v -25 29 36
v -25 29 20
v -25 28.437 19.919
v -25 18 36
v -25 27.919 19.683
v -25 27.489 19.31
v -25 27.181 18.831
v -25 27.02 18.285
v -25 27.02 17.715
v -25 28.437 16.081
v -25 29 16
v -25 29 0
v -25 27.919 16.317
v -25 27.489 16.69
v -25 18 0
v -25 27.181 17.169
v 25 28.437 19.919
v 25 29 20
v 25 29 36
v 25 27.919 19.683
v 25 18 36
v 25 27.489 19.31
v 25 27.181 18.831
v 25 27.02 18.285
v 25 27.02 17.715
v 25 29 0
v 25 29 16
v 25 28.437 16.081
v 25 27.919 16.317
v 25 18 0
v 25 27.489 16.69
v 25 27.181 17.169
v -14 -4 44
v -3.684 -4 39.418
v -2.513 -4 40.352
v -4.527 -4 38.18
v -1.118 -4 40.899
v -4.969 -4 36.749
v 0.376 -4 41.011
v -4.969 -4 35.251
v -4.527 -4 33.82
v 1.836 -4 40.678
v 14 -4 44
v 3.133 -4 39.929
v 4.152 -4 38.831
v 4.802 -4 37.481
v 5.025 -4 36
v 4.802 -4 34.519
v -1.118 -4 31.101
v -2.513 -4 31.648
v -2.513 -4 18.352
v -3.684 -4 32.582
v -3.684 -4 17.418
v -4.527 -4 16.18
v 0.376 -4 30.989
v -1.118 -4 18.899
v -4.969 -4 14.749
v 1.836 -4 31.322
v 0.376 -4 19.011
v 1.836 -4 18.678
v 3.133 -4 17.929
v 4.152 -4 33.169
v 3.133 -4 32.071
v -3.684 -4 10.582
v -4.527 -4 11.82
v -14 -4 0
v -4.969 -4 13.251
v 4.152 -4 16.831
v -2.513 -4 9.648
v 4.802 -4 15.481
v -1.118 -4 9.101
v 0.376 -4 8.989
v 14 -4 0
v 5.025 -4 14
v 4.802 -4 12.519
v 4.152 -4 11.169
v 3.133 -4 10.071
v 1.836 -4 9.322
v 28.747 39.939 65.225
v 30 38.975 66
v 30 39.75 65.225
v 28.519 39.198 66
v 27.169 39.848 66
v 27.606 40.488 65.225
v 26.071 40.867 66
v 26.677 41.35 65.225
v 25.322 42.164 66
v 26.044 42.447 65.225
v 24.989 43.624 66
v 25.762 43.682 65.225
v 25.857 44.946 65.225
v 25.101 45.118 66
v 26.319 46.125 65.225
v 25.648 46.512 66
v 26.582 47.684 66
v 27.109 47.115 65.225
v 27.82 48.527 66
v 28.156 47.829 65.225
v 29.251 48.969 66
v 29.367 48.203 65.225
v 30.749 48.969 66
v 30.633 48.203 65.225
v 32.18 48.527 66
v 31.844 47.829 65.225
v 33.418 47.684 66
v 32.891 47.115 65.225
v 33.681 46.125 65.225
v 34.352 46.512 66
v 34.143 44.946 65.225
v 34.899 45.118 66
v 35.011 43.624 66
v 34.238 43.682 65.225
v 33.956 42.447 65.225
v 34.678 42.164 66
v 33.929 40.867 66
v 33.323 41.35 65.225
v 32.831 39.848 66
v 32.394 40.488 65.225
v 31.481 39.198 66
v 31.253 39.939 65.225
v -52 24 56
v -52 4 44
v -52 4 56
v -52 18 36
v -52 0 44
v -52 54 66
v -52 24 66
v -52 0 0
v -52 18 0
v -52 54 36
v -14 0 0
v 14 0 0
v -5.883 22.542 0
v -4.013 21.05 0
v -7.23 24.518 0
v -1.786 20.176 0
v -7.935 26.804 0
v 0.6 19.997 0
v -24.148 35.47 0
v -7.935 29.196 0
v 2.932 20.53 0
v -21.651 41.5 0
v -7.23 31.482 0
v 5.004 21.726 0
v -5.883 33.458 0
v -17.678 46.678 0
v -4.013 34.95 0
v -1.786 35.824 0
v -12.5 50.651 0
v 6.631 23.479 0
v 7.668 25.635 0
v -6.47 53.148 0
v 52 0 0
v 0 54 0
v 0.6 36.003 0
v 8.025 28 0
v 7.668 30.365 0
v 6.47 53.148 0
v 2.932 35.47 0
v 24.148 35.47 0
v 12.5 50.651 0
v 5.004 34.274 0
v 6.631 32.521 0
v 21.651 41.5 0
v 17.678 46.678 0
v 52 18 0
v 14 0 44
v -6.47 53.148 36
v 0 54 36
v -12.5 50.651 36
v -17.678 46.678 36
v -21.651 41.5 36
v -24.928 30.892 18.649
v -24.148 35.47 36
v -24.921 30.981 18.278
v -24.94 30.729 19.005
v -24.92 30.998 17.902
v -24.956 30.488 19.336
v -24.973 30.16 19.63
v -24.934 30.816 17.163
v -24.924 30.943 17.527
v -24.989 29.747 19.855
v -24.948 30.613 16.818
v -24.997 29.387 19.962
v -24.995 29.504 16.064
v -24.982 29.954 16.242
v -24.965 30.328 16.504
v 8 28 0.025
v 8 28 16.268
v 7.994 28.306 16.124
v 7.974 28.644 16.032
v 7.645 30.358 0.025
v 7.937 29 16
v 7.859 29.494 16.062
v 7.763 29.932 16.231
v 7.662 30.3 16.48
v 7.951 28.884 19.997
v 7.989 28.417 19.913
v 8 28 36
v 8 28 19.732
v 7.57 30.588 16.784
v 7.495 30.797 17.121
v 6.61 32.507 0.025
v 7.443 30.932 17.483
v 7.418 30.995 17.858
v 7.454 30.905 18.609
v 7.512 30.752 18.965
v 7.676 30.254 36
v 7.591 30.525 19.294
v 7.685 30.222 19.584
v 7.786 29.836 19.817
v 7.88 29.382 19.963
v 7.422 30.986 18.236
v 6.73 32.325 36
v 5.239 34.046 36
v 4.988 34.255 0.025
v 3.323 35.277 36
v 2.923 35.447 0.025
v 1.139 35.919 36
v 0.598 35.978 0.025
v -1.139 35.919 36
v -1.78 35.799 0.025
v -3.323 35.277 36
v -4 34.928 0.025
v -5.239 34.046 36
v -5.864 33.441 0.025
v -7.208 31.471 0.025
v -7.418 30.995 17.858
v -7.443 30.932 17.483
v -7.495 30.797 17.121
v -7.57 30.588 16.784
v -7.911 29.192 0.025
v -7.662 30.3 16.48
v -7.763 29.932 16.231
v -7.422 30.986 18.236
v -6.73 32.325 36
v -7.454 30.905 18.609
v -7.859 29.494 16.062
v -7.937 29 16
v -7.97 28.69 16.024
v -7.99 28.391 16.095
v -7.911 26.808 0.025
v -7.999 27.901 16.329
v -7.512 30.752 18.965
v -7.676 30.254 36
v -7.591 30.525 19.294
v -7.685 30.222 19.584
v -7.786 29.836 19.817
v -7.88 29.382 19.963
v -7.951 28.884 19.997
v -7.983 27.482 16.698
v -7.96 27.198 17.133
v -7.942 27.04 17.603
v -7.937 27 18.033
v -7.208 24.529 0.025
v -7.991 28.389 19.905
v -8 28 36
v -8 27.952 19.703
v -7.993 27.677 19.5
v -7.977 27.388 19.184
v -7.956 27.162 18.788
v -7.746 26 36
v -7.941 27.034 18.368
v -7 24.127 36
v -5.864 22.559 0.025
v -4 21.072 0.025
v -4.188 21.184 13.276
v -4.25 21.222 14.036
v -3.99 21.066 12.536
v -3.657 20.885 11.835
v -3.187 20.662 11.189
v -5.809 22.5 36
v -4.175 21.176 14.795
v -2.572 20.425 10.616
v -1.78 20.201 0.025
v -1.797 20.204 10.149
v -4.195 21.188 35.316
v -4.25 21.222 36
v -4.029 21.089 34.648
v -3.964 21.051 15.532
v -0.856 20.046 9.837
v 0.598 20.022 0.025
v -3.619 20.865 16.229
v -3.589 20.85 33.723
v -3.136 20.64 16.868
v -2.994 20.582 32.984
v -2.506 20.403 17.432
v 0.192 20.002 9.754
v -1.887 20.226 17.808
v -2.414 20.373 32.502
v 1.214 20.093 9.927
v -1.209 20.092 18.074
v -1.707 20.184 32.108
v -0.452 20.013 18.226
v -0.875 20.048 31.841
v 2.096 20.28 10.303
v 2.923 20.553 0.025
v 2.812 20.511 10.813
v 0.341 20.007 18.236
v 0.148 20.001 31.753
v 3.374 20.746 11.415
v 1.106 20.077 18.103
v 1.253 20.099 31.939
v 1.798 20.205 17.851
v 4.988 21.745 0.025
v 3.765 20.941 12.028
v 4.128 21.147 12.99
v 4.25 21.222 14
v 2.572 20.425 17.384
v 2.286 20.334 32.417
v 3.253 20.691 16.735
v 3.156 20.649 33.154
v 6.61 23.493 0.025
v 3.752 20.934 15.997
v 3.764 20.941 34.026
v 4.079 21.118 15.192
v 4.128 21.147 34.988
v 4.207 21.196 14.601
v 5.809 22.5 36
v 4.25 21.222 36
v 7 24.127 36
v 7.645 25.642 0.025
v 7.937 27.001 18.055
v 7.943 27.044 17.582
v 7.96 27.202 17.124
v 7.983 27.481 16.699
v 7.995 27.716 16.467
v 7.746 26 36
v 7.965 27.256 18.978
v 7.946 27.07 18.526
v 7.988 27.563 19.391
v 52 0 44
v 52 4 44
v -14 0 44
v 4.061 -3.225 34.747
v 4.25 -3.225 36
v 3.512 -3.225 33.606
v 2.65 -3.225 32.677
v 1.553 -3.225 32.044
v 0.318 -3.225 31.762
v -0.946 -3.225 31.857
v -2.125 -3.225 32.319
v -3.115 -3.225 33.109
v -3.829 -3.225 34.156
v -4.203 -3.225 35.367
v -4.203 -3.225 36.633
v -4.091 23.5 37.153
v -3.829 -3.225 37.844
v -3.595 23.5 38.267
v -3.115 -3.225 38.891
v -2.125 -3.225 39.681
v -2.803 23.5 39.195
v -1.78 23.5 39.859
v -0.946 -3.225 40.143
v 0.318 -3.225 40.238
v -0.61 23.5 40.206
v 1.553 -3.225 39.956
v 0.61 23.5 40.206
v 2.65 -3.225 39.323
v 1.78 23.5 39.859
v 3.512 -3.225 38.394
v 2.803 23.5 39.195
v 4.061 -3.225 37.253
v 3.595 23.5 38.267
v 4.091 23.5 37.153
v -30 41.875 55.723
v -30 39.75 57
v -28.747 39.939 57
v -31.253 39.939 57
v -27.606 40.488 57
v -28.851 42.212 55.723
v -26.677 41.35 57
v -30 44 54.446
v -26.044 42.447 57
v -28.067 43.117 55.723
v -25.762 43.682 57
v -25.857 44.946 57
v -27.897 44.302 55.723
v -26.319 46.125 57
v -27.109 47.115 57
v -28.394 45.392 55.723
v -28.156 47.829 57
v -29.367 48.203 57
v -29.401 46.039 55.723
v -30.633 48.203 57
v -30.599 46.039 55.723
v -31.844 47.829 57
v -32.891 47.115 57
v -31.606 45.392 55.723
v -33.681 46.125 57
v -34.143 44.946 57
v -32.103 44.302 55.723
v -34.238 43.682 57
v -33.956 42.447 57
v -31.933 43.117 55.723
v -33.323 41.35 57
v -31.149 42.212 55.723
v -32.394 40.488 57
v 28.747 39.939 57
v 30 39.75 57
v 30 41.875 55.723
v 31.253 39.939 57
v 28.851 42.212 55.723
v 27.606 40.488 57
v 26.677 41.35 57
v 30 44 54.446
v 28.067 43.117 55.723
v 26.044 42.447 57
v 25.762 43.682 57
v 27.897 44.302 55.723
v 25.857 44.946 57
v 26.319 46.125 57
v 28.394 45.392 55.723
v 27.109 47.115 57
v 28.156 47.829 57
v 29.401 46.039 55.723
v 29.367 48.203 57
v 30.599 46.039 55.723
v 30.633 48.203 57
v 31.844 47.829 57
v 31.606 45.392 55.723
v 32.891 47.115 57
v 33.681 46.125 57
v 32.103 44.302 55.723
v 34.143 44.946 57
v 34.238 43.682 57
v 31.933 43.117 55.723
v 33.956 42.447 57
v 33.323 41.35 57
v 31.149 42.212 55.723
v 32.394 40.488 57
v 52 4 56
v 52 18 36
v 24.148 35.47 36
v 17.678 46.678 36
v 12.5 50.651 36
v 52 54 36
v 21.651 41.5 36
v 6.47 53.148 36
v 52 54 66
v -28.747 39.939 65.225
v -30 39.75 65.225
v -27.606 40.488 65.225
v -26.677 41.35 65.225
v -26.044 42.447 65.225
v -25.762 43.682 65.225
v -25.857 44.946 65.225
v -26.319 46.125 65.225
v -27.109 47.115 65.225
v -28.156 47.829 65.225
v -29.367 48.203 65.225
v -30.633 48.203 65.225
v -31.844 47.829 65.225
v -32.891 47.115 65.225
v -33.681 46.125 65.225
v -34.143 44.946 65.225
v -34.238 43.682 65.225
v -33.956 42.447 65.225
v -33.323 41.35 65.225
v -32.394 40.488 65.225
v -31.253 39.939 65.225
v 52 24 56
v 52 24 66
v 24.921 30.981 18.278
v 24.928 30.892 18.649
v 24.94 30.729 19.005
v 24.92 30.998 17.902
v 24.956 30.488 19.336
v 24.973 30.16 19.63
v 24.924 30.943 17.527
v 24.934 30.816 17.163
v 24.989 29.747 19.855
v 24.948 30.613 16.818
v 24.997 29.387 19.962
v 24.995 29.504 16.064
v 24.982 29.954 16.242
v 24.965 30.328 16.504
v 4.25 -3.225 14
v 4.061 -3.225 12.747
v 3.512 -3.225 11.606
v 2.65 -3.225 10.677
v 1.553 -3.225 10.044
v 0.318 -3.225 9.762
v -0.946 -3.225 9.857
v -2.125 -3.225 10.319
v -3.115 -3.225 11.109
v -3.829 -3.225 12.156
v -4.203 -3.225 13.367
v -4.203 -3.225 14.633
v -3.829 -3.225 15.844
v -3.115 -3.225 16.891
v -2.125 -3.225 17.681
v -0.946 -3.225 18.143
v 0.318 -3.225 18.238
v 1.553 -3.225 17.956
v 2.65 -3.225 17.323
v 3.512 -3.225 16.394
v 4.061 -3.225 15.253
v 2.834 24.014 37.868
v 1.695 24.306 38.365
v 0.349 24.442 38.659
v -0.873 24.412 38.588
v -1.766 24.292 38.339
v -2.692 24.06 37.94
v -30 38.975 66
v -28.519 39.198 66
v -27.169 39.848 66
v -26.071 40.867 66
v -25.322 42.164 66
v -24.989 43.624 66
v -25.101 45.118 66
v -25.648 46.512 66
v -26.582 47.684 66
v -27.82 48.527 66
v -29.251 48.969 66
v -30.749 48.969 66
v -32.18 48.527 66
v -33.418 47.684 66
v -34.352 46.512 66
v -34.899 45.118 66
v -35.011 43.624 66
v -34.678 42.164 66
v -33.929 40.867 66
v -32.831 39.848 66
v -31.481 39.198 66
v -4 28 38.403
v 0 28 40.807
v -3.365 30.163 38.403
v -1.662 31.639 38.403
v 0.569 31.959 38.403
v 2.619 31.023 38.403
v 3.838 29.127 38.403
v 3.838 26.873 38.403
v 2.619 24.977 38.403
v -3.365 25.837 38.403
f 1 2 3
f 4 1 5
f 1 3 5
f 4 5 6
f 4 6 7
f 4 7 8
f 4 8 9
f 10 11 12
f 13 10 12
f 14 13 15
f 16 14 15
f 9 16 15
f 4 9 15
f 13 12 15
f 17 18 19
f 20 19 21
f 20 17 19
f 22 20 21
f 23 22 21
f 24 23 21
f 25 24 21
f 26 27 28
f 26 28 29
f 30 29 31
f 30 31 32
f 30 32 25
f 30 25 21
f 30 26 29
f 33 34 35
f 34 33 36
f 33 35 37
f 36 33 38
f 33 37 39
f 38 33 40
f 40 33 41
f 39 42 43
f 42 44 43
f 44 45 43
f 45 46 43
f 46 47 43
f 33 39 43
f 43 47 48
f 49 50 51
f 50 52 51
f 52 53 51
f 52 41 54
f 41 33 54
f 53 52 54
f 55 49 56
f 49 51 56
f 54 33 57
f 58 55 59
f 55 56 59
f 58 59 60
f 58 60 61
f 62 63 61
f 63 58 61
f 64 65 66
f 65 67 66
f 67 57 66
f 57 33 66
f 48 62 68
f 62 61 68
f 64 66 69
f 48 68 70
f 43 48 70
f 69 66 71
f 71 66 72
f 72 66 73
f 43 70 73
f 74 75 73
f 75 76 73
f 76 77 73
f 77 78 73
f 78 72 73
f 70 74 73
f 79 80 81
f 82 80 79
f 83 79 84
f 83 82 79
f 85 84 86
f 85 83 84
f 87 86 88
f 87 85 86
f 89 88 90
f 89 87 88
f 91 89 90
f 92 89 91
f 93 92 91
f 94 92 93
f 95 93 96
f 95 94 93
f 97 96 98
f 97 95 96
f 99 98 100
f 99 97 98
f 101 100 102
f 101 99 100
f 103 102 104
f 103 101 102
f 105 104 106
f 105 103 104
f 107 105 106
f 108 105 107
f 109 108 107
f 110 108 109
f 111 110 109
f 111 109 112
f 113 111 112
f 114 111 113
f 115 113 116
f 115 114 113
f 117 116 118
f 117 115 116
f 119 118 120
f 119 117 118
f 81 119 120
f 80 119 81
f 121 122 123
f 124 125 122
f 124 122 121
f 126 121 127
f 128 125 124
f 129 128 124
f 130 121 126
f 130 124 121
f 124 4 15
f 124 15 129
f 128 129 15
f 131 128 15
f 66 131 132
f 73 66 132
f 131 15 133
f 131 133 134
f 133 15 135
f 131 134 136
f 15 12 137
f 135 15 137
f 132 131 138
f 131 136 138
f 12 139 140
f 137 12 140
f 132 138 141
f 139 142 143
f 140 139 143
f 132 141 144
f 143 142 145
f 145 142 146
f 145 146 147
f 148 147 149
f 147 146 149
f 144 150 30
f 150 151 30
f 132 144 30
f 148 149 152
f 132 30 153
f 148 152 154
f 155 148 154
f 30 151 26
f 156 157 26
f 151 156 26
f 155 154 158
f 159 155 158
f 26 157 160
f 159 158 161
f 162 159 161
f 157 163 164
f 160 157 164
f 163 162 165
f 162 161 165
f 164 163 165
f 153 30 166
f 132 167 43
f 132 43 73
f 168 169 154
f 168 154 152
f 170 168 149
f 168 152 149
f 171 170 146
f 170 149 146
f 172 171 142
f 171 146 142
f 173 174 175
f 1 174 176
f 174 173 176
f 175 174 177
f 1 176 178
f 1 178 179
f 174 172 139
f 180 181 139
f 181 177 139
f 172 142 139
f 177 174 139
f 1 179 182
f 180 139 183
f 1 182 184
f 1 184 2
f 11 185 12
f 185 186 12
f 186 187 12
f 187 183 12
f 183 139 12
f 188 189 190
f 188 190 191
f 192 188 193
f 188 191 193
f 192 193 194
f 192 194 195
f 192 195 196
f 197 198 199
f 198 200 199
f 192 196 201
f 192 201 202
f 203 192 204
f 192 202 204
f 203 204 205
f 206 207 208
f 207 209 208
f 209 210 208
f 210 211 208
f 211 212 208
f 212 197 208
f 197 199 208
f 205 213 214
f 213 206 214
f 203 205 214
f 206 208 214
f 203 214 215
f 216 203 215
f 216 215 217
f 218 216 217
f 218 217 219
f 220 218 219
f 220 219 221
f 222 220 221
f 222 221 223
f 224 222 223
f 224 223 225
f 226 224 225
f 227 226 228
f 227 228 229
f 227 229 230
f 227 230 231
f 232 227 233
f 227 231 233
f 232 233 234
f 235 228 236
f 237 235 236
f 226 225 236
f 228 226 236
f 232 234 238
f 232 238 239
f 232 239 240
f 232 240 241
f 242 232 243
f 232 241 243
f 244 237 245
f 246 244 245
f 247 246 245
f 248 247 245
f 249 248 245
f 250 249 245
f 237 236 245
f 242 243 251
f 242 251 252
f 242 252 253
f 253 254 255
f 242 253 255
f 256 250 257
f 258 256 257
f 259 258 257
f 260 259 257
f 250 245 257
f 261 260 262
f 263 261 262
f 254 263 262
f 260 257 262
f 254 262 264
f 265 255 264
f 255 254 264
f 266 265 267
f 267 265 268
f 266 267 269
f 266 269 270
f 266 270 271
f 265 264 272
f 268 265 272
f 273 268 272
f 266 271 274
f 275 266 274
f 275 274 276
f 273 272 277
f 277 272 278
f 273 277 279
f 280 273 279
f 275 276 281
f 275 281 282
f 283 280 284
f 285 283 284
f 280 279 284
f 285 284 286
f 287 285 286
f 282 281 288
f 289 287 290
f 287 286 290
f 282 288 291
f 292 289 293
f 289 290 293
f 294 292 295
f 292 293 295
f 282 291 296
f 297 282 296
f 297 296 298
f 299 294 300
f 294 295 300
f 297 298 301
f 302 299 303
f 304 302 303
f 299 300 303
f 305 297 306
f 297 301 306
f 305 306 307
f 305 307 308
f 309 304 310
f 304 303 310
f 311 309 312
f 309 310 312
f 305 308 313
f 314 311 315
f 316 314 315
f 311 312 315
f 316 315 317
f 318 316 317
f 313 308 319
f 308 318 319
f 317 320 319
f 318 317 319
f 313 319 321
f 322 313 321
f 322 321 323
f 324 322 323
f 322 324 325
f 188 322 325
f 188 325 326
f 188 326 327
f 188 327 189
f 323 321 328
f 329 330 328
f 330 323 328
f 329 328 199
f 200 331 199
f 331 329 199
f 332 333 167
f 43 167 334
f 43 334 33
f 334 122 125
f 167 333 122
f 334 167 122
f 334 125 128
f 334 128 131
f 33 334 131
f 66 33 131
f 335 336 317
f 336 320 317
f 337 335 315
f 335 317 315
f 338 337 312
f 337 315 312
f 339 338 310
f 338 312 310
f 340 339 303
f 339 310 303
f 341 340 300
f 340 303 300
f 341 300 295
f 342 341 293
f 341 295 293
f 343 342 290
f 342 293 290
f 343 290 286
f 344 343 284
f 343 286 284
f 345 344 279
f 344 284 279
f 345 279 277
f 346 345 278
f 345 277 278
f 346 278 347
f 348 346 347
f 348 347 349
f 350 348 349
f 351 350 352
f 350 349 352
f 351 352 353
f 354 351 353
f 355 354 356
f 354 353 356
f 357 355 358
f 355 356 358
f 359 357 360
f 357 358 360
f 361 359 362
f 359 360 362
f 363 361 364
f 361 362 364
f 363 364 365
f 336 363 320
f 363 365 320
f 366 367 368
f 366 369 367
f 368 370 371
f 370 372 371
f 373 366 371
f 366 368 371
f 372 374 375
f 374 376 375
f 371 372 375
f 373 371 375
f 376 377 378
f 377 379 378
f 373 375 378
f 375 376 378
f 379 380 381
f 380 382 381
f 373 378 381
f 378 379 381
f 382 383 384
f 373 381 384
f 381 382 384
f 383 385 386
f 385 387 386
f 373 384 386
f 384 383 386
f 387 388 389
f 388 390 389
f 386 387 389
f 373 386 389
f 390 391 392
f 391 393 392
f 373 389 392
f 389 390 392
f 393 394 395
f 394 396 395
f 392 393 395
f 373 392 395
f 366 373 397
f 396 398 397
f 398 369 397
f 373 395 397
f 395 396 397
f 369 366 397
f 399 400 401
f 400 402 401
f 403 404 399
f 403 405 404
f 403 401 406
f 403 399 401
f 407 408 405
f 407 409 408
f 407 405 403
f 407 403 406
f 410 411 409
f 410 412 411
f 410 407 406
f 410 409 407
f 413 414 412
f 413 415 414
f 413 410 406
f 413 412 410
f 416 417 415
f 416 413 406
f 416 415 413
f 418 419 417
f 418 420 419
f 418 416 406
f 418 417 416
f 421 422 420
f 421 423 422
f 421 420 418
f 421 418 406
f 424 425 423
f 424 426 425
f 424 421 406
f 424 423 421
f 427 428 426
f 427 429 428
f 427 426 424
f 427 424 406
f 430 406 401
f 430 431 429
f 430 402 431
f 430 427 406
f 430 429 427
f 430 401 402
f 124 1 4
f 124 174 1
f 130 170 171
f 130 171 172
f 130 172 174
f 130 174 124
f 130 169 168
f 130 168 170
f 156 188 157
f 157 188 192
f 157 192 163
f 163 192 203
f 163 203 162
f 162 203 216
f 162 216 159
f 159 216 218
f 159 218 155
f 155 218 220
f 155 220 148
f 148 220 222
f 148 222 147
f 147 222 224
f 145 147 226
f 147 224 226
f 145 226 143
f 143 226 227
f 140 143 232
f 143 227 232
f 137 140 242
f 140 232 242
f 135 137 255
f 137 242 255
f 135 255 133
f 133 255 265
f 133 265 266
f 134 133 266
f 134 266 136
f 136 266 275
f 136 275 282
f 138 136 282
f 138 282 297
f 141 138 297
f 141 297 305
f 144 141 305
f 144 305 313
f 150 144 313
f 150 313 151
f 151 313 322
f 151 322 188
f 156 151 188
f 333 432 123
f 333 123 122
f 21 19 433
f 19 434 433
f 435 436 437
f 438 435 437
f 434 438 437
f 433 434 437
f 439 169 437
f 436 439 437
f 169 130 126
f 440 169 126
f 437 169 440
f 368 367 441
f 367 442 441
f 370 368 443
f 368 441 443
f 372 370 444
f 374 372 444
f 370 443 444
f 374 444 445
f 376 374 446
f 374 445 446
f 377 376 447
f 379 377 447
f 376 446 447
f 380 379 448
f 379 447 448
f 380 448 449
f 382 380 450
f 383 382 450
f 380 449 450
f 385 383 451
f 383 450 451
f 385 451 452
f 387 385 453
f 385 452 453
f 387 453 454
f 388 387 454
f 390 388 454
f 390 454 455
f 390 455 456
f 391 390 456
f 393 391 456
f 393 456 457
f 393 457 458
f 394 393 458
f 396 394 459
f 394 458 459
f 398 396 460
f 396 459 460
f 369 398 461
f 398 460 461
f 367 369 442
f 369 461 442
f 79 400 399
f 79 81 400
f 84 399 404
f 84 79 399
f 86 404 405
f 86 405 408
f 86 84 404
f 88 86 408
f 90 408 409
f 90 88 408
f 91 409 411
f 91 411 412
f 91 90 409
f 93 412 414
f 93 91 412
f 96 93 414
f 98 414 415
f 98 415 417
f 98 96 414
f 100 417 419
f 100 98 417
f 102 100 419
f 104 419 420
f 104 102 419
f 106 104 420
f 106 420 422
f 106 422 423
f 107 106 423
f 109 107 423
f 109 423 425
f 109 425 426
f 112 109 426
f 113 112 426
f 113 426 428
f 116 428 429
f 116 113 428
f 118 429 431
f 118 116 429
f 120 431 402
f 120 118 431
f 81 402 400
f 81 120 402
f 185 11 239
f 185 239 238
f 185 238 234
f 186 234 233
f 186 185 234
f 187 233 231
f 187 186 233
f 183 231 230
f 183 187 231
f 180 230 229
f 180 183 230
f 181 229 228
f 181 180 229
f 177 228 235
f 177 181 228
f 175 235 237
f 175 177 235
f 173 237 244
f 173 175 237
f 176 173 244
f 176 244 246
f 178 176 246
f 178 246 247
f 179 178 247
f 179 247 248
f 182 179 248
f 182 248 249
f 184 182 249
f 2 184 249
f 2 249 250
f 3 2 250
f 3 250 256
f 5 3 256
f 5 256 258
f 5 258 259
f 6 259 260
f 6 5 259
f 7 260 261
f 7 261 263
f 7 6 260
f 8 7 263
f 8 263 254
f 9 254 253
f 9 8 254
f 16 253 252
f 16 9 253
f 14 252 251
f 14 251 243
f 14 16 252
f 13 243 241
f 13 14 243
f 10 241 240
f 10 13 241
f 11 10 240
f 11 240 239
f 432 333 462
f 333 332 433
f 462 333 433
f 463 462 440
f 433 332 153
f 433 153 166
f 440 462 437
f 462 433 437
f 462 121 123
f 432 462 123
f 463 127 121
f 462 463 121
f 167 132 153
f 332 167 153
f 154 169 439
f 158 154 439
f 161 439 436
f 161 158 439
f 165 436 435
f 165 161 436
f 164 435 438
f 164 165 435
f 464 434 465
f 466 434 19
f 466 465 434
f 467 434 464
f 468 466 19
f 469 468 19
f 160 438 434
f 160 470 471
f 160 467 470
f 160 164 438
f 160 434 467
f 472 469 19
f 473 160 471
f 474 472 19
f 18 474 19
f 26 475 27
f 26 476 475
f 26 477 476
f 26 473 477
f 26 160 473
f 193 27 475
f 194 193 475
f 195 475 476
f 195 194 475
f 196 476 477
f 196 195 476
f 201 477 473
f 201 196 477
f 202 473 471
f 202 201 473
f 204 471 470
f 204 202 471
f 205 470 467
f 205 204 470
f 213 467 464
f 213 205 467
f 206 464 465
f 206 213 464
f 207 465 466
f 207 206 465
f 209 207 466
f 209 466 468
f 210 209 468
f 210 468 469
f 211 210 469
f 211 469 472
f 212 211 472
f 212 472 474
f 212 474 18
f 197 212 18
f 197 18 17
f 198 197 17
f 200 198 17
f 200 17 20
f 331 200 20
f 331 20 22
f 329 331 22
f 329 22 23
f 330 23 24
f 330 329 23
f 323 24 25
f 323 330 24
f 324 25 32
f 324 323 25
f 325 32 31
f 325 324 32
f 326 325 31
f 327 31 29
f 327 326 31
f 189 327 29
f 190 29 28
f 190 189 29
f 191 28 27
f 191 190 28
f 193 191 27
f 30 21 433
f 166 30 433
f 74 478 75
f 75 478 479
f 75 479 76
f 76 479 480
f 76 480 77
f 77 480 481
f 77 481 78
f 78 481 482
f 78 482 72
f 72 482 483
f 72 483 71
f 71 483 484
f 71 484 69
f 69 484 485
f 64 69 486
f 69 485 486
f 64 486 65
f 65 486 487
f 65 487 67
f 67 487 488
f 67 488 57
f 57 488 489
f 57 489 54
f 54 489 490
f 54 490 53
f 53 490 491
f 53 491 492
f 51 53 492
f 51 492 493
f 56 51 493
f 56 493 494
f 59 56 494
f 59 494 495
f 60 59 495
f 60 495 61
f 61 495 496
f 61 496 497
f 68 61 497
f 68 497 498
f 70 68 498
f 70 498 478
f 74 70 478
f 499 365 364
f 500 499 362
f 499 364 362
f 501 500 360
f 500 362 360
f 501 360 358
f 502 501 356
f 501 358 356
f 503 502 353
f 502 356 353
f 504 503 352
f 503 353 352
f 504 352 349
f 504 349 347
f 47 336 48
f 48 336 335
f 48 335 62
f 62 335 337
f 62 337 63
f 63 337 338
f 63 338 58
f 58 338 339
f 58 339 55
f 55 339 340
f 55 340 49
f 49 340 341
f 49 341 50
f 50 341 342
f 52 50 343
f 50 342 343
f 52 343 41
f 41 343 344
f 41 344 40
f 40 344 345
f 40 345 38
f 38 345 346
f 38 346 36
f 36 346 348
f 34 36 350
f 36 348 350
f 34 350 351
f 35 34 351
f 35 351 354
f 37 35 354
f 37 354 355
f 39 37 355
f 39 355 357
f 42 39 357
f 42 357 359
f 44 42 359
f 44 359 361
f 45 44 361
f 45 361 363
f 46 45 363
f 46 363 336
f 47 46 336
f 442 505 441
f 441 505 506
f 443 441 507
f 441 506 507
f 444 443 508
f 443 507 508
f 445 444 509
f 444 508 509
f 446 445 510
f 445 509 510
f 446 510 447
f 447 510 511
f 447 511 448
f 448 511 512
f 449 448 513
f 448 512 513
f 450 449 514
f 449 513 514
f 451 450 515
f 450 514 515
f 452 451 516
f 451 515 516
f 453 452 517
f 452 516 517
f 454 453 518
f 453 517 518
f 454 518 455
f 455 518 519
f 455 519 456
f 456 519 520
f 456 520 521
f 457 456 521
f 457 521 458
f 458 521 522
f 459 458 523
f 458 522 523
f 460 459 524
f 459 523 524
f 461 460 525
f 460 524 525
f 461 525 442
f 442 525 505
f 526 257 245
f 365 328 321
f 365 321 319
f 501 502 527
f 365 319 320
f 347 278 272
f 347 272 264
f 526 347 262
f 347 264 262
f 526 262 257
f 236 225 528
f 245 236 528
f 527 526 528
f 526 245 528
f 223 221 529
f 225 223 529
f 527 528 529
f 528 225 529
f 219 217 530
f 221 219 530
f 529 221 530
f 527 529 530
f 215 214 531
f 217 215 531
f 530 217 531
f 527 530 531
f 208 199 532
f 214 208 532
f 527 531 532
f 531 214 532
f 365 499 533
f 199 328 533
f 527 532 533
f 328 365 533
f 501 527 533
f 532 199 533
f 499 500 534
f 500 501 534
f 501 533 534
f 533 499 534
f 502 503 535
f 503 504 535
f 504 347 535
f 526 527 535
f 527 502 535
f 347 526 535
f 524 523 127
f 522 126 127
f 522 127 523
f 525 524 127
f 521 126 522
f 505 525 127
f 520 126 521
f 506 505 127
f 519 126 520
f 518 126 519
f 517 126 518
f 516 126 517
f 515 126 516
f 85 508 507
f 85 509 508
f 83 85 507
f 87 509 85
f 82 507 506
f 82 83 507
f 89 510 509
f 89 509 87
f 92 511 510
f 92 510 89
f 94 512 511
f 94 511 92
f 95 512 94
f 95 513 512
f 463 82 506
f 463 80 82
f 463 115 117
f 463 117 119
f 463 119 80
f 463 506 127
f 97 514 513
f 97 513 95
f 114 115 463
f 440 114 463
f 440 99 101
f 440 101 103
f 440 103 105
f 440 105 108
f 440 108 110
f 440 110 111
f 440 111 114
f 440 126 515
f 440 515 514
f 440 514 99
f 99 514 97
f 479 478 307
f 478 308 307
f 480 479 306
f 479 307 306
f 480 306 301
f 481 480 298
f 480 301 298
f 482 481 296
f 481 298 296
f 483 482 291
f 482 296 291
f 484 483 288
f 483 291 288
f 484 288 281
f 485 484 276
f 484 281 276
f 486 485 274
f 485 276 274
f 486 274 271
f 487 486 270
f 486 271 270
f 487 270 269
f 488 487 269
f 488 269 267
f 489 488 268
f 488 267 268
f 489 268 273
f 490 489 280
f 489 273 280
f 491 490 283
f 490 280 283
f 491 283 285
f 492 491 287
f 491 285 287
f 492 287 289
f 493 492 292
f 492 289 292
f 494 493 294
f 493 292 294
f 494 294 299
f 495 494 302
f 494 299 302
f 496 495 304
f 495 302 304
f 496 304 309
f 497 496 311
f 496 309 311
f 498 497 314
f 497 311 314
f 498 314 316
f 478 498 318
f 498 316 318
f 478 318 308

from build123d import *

# Parameters (mm, degrees)
CROQUIS2_W                                = 104
CROQUIS2_H                                = 54
SALIENTE_EXTRUIR1_DEPTH                   = 66
CORTAR_EXTRUIR1_DEPTH                     = 36
TALADROS_DE_ESPIGA_DE_16_0MM1_D           = 16
TALADROS_DE_ESPIGA_DE_16_0MM1_DEPTH       = 36
TALADROS_DE_ESPIGA_DE_16_0MM1_CSINK_D     = 16.05
TALADROS_DE_ESPIGA_DE_16_0MM1_CSINK_ANGLE = 90
TALADROS_DE_ESPIGA_DE_16_0MM1_TIP         = 4.806884952
CROQUIS7_W                                = 28
CROQUIS7_H                                = 44
SALIENTE_EXTRUIR2_DEPTH                   = 4
CORTAR_EXTRUIR3_DEPTH                     = 100.879927913
CORTAR_EXTRUIR3_DEPTH_BACK                = 100.879927913
CORTAR_EXTRUIR4_DEPTH                     = 100.879927913
CORTAR_EXTRUIR4_DEPTH_BACK                = 100.879927913
CROQUIS9_R                                = 2
TALADRO_ROSCADO_M102_D                    = 8.5
TALADRO_ROSCADO_M102_DEPTH                = 27.5
TALADRO_ROSCADO_M102_CSINK_D              = 10.05
TALADRO_ROSCADO_M102_CSINK_ANGLE          = 90
TALADRO_ROSCADO_M102_TIP                  = 2.553657631


with BuildPart() as part:
    # Croquis2 → Saliente-Extruir1 (new body)
    with BuildSketch(Plane.XY):
        with Locations((0, 27)):
            Rectangle(CROQUIS2_W, CROQUIS2_H)
    extrude(amount=SALIENTE_EXTRUIR1_DEPTH)

    # Croquis3 → Cortar-Extruir1 (cut)
    with BuildSketch(Plane.XY):
        with BuildLine():
            Line((25, 29), (25, 18))
            Line((25, 18), (52, 18))
            Line((52, 18), (52, 54))
            Line((52, 54), (0, 54))
            ThreePointArc((0, 54), (17.67766953, 46.67766953), (25, 29))
        make_face()
    cortar_extruir1 = extrude(amount=CORTAR_EXTRUIR1_DEPTH, mode=Mode.SUBTRACT)

    # Simetría1: Cortar-Extruir1 across plane
    add(cortar_extruir1.mirror(Plane(origin=(0, 0, 0), x_dir=(0, 0, 1), z_dir=(1, 0, 0))), mode=Mode.SUBTRACT)

    # Taladros de espiga de Ø16.0mm1
    with Locations(Plane(origin=(0, 0, 0), x_dir=(-1, 0, 0), z_dir=(0, 0, -1))):
        with Locations((0, 28)):
            CounterSinkHole(TALADROS_DE_ESPIGA_DE_16_0MM1_D / 2, TALADROS_DE_ESPIGA_DE_16_0MM1_CSINK_D / 2, depth=TALADROS_DE_ESPIGA_DE_16_0MM1_DEPTH, counter_sink_angle=TALADROS_DE_ESPIGA_DE_16_0MM1_CSINK_ANGLE)
            with Locations((0, 0, -(TALADROS_DE_ESPIGA_DE_16_0MM1_DEPTH + TALADROS_DE_ESPIGA_DE_16_0MM1_TIP / 2))):  # 118° drill point
                Cone(0, TALADROS_DE_ESPIGA_DE_16_0MM1_D / 2, TALADROS_DE_ESPIGA_DE_16_0MM1_TIP, mode=Mode.SUBTRACT)

    # Croquis7 → Saliente-Extruir2 (add)
    with BuildSketch(Plane(origin=(0, 0, 0), x_dir=(1, 0, 0), z_dir=(0, 1, 0))):
        with Locations((0, -22)):
            Rectangle(CROQUIS7_W, CROQUIS7_H)
    extrude(amount=-SALIENTE_EXTRUIR2_DEPTH)

    # Croquis8 → Cortar-Extruir3 (cut, two sides: drawn at the far end of the back side and taken through both)
    with BuildSketch(Plane(origin=(0, 0, 0), x_dir=(0, 0, -1), z_dir=(1, 0, 0)).offset(-CORTAR_EXTRUIR3_DEPTH_BACK)):
        Polygon((-44, 0), (-56.494918643, 0), (-66, 0), (-66, 24), (-56, 24), (-56, 4), (-44, 4), align=None)
    extrude(amount=CORTAR_EXTRUIR3_DEPTH + CORTAR_EXTRUIR3_DEPTH_BACK, mode=Mode.SUBTRACT)

    # Croquis9 → Cortar-Extruir4 (cut, two sides: drawn at the far end of the back side and taken through both)
    with BuildSketch(Plane(origin=(0, 0, 0), x_dir=(0, 0, -1), z_dir=(1, 0, 0)).offset(-CORTAR_EXTRUIR4_DEPTH_BACK)):
        with Locations((-18, 29)):
            Circle(CROQUIS9_R)
    extrude(amount=CORTAR_EXTRUIR4_DEPTH + CORTAR_EXTRUIR4_DEPTH_BACK, mode=Mode.SUBTRACT)

    # Croquis13 → Taladro roscado M101 (revolve, cut)
    with BuildSketch(Plane(origin=(30, 44, 66), x_dir=(0, -1, 0), z_dir=(1, 0, 0))):
        Polygon((0, 0), (0, 11.553657631), (4.25, 9), (4.25, 0.775), (5.025, 0), align=None)
    taladro_roscado_m101 = revolve(axis=Axis((30, 44, 72.35), (0, 0, -1)), mode=Mode.SUBTRACT)

    # Simetría2: Taladro roscado M101 across plane
    add(taladro_roscado_m101.mirror(Plane.ZY), mode=Mode.SUBTRACT)

    # Taladro roscado M102
    with Locations(Plane(origin=(0, -4, 0), x_dir=(-1, 0, 0), z_dir=(0, -1, 0))):
        with Locations((0, -36), (0, -14)):
            CounterSinkHole(TALADRO_ROSCADO_M102_D / 2, TALADRO_ROSCADO_M102_CSINK_D / 2, depth=TALADRO_ROSCADO_M102_DEPTH, counter_sink_angle=TALADRO_ROSCADO_M102_CSINK_ANGLE)
            with Locations((0, 0, -(TALADRO_ROSCADO_M102_DEPTH + TALADRO_ROSCADO_M102_TIP / 2))):  # 118° drill point
                Cone(0, TALADRO_ROSCADO_M102_D / 2, TALADRO_ROSCADO_M102_TIP, mode=Mode.SUBTRACT)


solid = part.part
